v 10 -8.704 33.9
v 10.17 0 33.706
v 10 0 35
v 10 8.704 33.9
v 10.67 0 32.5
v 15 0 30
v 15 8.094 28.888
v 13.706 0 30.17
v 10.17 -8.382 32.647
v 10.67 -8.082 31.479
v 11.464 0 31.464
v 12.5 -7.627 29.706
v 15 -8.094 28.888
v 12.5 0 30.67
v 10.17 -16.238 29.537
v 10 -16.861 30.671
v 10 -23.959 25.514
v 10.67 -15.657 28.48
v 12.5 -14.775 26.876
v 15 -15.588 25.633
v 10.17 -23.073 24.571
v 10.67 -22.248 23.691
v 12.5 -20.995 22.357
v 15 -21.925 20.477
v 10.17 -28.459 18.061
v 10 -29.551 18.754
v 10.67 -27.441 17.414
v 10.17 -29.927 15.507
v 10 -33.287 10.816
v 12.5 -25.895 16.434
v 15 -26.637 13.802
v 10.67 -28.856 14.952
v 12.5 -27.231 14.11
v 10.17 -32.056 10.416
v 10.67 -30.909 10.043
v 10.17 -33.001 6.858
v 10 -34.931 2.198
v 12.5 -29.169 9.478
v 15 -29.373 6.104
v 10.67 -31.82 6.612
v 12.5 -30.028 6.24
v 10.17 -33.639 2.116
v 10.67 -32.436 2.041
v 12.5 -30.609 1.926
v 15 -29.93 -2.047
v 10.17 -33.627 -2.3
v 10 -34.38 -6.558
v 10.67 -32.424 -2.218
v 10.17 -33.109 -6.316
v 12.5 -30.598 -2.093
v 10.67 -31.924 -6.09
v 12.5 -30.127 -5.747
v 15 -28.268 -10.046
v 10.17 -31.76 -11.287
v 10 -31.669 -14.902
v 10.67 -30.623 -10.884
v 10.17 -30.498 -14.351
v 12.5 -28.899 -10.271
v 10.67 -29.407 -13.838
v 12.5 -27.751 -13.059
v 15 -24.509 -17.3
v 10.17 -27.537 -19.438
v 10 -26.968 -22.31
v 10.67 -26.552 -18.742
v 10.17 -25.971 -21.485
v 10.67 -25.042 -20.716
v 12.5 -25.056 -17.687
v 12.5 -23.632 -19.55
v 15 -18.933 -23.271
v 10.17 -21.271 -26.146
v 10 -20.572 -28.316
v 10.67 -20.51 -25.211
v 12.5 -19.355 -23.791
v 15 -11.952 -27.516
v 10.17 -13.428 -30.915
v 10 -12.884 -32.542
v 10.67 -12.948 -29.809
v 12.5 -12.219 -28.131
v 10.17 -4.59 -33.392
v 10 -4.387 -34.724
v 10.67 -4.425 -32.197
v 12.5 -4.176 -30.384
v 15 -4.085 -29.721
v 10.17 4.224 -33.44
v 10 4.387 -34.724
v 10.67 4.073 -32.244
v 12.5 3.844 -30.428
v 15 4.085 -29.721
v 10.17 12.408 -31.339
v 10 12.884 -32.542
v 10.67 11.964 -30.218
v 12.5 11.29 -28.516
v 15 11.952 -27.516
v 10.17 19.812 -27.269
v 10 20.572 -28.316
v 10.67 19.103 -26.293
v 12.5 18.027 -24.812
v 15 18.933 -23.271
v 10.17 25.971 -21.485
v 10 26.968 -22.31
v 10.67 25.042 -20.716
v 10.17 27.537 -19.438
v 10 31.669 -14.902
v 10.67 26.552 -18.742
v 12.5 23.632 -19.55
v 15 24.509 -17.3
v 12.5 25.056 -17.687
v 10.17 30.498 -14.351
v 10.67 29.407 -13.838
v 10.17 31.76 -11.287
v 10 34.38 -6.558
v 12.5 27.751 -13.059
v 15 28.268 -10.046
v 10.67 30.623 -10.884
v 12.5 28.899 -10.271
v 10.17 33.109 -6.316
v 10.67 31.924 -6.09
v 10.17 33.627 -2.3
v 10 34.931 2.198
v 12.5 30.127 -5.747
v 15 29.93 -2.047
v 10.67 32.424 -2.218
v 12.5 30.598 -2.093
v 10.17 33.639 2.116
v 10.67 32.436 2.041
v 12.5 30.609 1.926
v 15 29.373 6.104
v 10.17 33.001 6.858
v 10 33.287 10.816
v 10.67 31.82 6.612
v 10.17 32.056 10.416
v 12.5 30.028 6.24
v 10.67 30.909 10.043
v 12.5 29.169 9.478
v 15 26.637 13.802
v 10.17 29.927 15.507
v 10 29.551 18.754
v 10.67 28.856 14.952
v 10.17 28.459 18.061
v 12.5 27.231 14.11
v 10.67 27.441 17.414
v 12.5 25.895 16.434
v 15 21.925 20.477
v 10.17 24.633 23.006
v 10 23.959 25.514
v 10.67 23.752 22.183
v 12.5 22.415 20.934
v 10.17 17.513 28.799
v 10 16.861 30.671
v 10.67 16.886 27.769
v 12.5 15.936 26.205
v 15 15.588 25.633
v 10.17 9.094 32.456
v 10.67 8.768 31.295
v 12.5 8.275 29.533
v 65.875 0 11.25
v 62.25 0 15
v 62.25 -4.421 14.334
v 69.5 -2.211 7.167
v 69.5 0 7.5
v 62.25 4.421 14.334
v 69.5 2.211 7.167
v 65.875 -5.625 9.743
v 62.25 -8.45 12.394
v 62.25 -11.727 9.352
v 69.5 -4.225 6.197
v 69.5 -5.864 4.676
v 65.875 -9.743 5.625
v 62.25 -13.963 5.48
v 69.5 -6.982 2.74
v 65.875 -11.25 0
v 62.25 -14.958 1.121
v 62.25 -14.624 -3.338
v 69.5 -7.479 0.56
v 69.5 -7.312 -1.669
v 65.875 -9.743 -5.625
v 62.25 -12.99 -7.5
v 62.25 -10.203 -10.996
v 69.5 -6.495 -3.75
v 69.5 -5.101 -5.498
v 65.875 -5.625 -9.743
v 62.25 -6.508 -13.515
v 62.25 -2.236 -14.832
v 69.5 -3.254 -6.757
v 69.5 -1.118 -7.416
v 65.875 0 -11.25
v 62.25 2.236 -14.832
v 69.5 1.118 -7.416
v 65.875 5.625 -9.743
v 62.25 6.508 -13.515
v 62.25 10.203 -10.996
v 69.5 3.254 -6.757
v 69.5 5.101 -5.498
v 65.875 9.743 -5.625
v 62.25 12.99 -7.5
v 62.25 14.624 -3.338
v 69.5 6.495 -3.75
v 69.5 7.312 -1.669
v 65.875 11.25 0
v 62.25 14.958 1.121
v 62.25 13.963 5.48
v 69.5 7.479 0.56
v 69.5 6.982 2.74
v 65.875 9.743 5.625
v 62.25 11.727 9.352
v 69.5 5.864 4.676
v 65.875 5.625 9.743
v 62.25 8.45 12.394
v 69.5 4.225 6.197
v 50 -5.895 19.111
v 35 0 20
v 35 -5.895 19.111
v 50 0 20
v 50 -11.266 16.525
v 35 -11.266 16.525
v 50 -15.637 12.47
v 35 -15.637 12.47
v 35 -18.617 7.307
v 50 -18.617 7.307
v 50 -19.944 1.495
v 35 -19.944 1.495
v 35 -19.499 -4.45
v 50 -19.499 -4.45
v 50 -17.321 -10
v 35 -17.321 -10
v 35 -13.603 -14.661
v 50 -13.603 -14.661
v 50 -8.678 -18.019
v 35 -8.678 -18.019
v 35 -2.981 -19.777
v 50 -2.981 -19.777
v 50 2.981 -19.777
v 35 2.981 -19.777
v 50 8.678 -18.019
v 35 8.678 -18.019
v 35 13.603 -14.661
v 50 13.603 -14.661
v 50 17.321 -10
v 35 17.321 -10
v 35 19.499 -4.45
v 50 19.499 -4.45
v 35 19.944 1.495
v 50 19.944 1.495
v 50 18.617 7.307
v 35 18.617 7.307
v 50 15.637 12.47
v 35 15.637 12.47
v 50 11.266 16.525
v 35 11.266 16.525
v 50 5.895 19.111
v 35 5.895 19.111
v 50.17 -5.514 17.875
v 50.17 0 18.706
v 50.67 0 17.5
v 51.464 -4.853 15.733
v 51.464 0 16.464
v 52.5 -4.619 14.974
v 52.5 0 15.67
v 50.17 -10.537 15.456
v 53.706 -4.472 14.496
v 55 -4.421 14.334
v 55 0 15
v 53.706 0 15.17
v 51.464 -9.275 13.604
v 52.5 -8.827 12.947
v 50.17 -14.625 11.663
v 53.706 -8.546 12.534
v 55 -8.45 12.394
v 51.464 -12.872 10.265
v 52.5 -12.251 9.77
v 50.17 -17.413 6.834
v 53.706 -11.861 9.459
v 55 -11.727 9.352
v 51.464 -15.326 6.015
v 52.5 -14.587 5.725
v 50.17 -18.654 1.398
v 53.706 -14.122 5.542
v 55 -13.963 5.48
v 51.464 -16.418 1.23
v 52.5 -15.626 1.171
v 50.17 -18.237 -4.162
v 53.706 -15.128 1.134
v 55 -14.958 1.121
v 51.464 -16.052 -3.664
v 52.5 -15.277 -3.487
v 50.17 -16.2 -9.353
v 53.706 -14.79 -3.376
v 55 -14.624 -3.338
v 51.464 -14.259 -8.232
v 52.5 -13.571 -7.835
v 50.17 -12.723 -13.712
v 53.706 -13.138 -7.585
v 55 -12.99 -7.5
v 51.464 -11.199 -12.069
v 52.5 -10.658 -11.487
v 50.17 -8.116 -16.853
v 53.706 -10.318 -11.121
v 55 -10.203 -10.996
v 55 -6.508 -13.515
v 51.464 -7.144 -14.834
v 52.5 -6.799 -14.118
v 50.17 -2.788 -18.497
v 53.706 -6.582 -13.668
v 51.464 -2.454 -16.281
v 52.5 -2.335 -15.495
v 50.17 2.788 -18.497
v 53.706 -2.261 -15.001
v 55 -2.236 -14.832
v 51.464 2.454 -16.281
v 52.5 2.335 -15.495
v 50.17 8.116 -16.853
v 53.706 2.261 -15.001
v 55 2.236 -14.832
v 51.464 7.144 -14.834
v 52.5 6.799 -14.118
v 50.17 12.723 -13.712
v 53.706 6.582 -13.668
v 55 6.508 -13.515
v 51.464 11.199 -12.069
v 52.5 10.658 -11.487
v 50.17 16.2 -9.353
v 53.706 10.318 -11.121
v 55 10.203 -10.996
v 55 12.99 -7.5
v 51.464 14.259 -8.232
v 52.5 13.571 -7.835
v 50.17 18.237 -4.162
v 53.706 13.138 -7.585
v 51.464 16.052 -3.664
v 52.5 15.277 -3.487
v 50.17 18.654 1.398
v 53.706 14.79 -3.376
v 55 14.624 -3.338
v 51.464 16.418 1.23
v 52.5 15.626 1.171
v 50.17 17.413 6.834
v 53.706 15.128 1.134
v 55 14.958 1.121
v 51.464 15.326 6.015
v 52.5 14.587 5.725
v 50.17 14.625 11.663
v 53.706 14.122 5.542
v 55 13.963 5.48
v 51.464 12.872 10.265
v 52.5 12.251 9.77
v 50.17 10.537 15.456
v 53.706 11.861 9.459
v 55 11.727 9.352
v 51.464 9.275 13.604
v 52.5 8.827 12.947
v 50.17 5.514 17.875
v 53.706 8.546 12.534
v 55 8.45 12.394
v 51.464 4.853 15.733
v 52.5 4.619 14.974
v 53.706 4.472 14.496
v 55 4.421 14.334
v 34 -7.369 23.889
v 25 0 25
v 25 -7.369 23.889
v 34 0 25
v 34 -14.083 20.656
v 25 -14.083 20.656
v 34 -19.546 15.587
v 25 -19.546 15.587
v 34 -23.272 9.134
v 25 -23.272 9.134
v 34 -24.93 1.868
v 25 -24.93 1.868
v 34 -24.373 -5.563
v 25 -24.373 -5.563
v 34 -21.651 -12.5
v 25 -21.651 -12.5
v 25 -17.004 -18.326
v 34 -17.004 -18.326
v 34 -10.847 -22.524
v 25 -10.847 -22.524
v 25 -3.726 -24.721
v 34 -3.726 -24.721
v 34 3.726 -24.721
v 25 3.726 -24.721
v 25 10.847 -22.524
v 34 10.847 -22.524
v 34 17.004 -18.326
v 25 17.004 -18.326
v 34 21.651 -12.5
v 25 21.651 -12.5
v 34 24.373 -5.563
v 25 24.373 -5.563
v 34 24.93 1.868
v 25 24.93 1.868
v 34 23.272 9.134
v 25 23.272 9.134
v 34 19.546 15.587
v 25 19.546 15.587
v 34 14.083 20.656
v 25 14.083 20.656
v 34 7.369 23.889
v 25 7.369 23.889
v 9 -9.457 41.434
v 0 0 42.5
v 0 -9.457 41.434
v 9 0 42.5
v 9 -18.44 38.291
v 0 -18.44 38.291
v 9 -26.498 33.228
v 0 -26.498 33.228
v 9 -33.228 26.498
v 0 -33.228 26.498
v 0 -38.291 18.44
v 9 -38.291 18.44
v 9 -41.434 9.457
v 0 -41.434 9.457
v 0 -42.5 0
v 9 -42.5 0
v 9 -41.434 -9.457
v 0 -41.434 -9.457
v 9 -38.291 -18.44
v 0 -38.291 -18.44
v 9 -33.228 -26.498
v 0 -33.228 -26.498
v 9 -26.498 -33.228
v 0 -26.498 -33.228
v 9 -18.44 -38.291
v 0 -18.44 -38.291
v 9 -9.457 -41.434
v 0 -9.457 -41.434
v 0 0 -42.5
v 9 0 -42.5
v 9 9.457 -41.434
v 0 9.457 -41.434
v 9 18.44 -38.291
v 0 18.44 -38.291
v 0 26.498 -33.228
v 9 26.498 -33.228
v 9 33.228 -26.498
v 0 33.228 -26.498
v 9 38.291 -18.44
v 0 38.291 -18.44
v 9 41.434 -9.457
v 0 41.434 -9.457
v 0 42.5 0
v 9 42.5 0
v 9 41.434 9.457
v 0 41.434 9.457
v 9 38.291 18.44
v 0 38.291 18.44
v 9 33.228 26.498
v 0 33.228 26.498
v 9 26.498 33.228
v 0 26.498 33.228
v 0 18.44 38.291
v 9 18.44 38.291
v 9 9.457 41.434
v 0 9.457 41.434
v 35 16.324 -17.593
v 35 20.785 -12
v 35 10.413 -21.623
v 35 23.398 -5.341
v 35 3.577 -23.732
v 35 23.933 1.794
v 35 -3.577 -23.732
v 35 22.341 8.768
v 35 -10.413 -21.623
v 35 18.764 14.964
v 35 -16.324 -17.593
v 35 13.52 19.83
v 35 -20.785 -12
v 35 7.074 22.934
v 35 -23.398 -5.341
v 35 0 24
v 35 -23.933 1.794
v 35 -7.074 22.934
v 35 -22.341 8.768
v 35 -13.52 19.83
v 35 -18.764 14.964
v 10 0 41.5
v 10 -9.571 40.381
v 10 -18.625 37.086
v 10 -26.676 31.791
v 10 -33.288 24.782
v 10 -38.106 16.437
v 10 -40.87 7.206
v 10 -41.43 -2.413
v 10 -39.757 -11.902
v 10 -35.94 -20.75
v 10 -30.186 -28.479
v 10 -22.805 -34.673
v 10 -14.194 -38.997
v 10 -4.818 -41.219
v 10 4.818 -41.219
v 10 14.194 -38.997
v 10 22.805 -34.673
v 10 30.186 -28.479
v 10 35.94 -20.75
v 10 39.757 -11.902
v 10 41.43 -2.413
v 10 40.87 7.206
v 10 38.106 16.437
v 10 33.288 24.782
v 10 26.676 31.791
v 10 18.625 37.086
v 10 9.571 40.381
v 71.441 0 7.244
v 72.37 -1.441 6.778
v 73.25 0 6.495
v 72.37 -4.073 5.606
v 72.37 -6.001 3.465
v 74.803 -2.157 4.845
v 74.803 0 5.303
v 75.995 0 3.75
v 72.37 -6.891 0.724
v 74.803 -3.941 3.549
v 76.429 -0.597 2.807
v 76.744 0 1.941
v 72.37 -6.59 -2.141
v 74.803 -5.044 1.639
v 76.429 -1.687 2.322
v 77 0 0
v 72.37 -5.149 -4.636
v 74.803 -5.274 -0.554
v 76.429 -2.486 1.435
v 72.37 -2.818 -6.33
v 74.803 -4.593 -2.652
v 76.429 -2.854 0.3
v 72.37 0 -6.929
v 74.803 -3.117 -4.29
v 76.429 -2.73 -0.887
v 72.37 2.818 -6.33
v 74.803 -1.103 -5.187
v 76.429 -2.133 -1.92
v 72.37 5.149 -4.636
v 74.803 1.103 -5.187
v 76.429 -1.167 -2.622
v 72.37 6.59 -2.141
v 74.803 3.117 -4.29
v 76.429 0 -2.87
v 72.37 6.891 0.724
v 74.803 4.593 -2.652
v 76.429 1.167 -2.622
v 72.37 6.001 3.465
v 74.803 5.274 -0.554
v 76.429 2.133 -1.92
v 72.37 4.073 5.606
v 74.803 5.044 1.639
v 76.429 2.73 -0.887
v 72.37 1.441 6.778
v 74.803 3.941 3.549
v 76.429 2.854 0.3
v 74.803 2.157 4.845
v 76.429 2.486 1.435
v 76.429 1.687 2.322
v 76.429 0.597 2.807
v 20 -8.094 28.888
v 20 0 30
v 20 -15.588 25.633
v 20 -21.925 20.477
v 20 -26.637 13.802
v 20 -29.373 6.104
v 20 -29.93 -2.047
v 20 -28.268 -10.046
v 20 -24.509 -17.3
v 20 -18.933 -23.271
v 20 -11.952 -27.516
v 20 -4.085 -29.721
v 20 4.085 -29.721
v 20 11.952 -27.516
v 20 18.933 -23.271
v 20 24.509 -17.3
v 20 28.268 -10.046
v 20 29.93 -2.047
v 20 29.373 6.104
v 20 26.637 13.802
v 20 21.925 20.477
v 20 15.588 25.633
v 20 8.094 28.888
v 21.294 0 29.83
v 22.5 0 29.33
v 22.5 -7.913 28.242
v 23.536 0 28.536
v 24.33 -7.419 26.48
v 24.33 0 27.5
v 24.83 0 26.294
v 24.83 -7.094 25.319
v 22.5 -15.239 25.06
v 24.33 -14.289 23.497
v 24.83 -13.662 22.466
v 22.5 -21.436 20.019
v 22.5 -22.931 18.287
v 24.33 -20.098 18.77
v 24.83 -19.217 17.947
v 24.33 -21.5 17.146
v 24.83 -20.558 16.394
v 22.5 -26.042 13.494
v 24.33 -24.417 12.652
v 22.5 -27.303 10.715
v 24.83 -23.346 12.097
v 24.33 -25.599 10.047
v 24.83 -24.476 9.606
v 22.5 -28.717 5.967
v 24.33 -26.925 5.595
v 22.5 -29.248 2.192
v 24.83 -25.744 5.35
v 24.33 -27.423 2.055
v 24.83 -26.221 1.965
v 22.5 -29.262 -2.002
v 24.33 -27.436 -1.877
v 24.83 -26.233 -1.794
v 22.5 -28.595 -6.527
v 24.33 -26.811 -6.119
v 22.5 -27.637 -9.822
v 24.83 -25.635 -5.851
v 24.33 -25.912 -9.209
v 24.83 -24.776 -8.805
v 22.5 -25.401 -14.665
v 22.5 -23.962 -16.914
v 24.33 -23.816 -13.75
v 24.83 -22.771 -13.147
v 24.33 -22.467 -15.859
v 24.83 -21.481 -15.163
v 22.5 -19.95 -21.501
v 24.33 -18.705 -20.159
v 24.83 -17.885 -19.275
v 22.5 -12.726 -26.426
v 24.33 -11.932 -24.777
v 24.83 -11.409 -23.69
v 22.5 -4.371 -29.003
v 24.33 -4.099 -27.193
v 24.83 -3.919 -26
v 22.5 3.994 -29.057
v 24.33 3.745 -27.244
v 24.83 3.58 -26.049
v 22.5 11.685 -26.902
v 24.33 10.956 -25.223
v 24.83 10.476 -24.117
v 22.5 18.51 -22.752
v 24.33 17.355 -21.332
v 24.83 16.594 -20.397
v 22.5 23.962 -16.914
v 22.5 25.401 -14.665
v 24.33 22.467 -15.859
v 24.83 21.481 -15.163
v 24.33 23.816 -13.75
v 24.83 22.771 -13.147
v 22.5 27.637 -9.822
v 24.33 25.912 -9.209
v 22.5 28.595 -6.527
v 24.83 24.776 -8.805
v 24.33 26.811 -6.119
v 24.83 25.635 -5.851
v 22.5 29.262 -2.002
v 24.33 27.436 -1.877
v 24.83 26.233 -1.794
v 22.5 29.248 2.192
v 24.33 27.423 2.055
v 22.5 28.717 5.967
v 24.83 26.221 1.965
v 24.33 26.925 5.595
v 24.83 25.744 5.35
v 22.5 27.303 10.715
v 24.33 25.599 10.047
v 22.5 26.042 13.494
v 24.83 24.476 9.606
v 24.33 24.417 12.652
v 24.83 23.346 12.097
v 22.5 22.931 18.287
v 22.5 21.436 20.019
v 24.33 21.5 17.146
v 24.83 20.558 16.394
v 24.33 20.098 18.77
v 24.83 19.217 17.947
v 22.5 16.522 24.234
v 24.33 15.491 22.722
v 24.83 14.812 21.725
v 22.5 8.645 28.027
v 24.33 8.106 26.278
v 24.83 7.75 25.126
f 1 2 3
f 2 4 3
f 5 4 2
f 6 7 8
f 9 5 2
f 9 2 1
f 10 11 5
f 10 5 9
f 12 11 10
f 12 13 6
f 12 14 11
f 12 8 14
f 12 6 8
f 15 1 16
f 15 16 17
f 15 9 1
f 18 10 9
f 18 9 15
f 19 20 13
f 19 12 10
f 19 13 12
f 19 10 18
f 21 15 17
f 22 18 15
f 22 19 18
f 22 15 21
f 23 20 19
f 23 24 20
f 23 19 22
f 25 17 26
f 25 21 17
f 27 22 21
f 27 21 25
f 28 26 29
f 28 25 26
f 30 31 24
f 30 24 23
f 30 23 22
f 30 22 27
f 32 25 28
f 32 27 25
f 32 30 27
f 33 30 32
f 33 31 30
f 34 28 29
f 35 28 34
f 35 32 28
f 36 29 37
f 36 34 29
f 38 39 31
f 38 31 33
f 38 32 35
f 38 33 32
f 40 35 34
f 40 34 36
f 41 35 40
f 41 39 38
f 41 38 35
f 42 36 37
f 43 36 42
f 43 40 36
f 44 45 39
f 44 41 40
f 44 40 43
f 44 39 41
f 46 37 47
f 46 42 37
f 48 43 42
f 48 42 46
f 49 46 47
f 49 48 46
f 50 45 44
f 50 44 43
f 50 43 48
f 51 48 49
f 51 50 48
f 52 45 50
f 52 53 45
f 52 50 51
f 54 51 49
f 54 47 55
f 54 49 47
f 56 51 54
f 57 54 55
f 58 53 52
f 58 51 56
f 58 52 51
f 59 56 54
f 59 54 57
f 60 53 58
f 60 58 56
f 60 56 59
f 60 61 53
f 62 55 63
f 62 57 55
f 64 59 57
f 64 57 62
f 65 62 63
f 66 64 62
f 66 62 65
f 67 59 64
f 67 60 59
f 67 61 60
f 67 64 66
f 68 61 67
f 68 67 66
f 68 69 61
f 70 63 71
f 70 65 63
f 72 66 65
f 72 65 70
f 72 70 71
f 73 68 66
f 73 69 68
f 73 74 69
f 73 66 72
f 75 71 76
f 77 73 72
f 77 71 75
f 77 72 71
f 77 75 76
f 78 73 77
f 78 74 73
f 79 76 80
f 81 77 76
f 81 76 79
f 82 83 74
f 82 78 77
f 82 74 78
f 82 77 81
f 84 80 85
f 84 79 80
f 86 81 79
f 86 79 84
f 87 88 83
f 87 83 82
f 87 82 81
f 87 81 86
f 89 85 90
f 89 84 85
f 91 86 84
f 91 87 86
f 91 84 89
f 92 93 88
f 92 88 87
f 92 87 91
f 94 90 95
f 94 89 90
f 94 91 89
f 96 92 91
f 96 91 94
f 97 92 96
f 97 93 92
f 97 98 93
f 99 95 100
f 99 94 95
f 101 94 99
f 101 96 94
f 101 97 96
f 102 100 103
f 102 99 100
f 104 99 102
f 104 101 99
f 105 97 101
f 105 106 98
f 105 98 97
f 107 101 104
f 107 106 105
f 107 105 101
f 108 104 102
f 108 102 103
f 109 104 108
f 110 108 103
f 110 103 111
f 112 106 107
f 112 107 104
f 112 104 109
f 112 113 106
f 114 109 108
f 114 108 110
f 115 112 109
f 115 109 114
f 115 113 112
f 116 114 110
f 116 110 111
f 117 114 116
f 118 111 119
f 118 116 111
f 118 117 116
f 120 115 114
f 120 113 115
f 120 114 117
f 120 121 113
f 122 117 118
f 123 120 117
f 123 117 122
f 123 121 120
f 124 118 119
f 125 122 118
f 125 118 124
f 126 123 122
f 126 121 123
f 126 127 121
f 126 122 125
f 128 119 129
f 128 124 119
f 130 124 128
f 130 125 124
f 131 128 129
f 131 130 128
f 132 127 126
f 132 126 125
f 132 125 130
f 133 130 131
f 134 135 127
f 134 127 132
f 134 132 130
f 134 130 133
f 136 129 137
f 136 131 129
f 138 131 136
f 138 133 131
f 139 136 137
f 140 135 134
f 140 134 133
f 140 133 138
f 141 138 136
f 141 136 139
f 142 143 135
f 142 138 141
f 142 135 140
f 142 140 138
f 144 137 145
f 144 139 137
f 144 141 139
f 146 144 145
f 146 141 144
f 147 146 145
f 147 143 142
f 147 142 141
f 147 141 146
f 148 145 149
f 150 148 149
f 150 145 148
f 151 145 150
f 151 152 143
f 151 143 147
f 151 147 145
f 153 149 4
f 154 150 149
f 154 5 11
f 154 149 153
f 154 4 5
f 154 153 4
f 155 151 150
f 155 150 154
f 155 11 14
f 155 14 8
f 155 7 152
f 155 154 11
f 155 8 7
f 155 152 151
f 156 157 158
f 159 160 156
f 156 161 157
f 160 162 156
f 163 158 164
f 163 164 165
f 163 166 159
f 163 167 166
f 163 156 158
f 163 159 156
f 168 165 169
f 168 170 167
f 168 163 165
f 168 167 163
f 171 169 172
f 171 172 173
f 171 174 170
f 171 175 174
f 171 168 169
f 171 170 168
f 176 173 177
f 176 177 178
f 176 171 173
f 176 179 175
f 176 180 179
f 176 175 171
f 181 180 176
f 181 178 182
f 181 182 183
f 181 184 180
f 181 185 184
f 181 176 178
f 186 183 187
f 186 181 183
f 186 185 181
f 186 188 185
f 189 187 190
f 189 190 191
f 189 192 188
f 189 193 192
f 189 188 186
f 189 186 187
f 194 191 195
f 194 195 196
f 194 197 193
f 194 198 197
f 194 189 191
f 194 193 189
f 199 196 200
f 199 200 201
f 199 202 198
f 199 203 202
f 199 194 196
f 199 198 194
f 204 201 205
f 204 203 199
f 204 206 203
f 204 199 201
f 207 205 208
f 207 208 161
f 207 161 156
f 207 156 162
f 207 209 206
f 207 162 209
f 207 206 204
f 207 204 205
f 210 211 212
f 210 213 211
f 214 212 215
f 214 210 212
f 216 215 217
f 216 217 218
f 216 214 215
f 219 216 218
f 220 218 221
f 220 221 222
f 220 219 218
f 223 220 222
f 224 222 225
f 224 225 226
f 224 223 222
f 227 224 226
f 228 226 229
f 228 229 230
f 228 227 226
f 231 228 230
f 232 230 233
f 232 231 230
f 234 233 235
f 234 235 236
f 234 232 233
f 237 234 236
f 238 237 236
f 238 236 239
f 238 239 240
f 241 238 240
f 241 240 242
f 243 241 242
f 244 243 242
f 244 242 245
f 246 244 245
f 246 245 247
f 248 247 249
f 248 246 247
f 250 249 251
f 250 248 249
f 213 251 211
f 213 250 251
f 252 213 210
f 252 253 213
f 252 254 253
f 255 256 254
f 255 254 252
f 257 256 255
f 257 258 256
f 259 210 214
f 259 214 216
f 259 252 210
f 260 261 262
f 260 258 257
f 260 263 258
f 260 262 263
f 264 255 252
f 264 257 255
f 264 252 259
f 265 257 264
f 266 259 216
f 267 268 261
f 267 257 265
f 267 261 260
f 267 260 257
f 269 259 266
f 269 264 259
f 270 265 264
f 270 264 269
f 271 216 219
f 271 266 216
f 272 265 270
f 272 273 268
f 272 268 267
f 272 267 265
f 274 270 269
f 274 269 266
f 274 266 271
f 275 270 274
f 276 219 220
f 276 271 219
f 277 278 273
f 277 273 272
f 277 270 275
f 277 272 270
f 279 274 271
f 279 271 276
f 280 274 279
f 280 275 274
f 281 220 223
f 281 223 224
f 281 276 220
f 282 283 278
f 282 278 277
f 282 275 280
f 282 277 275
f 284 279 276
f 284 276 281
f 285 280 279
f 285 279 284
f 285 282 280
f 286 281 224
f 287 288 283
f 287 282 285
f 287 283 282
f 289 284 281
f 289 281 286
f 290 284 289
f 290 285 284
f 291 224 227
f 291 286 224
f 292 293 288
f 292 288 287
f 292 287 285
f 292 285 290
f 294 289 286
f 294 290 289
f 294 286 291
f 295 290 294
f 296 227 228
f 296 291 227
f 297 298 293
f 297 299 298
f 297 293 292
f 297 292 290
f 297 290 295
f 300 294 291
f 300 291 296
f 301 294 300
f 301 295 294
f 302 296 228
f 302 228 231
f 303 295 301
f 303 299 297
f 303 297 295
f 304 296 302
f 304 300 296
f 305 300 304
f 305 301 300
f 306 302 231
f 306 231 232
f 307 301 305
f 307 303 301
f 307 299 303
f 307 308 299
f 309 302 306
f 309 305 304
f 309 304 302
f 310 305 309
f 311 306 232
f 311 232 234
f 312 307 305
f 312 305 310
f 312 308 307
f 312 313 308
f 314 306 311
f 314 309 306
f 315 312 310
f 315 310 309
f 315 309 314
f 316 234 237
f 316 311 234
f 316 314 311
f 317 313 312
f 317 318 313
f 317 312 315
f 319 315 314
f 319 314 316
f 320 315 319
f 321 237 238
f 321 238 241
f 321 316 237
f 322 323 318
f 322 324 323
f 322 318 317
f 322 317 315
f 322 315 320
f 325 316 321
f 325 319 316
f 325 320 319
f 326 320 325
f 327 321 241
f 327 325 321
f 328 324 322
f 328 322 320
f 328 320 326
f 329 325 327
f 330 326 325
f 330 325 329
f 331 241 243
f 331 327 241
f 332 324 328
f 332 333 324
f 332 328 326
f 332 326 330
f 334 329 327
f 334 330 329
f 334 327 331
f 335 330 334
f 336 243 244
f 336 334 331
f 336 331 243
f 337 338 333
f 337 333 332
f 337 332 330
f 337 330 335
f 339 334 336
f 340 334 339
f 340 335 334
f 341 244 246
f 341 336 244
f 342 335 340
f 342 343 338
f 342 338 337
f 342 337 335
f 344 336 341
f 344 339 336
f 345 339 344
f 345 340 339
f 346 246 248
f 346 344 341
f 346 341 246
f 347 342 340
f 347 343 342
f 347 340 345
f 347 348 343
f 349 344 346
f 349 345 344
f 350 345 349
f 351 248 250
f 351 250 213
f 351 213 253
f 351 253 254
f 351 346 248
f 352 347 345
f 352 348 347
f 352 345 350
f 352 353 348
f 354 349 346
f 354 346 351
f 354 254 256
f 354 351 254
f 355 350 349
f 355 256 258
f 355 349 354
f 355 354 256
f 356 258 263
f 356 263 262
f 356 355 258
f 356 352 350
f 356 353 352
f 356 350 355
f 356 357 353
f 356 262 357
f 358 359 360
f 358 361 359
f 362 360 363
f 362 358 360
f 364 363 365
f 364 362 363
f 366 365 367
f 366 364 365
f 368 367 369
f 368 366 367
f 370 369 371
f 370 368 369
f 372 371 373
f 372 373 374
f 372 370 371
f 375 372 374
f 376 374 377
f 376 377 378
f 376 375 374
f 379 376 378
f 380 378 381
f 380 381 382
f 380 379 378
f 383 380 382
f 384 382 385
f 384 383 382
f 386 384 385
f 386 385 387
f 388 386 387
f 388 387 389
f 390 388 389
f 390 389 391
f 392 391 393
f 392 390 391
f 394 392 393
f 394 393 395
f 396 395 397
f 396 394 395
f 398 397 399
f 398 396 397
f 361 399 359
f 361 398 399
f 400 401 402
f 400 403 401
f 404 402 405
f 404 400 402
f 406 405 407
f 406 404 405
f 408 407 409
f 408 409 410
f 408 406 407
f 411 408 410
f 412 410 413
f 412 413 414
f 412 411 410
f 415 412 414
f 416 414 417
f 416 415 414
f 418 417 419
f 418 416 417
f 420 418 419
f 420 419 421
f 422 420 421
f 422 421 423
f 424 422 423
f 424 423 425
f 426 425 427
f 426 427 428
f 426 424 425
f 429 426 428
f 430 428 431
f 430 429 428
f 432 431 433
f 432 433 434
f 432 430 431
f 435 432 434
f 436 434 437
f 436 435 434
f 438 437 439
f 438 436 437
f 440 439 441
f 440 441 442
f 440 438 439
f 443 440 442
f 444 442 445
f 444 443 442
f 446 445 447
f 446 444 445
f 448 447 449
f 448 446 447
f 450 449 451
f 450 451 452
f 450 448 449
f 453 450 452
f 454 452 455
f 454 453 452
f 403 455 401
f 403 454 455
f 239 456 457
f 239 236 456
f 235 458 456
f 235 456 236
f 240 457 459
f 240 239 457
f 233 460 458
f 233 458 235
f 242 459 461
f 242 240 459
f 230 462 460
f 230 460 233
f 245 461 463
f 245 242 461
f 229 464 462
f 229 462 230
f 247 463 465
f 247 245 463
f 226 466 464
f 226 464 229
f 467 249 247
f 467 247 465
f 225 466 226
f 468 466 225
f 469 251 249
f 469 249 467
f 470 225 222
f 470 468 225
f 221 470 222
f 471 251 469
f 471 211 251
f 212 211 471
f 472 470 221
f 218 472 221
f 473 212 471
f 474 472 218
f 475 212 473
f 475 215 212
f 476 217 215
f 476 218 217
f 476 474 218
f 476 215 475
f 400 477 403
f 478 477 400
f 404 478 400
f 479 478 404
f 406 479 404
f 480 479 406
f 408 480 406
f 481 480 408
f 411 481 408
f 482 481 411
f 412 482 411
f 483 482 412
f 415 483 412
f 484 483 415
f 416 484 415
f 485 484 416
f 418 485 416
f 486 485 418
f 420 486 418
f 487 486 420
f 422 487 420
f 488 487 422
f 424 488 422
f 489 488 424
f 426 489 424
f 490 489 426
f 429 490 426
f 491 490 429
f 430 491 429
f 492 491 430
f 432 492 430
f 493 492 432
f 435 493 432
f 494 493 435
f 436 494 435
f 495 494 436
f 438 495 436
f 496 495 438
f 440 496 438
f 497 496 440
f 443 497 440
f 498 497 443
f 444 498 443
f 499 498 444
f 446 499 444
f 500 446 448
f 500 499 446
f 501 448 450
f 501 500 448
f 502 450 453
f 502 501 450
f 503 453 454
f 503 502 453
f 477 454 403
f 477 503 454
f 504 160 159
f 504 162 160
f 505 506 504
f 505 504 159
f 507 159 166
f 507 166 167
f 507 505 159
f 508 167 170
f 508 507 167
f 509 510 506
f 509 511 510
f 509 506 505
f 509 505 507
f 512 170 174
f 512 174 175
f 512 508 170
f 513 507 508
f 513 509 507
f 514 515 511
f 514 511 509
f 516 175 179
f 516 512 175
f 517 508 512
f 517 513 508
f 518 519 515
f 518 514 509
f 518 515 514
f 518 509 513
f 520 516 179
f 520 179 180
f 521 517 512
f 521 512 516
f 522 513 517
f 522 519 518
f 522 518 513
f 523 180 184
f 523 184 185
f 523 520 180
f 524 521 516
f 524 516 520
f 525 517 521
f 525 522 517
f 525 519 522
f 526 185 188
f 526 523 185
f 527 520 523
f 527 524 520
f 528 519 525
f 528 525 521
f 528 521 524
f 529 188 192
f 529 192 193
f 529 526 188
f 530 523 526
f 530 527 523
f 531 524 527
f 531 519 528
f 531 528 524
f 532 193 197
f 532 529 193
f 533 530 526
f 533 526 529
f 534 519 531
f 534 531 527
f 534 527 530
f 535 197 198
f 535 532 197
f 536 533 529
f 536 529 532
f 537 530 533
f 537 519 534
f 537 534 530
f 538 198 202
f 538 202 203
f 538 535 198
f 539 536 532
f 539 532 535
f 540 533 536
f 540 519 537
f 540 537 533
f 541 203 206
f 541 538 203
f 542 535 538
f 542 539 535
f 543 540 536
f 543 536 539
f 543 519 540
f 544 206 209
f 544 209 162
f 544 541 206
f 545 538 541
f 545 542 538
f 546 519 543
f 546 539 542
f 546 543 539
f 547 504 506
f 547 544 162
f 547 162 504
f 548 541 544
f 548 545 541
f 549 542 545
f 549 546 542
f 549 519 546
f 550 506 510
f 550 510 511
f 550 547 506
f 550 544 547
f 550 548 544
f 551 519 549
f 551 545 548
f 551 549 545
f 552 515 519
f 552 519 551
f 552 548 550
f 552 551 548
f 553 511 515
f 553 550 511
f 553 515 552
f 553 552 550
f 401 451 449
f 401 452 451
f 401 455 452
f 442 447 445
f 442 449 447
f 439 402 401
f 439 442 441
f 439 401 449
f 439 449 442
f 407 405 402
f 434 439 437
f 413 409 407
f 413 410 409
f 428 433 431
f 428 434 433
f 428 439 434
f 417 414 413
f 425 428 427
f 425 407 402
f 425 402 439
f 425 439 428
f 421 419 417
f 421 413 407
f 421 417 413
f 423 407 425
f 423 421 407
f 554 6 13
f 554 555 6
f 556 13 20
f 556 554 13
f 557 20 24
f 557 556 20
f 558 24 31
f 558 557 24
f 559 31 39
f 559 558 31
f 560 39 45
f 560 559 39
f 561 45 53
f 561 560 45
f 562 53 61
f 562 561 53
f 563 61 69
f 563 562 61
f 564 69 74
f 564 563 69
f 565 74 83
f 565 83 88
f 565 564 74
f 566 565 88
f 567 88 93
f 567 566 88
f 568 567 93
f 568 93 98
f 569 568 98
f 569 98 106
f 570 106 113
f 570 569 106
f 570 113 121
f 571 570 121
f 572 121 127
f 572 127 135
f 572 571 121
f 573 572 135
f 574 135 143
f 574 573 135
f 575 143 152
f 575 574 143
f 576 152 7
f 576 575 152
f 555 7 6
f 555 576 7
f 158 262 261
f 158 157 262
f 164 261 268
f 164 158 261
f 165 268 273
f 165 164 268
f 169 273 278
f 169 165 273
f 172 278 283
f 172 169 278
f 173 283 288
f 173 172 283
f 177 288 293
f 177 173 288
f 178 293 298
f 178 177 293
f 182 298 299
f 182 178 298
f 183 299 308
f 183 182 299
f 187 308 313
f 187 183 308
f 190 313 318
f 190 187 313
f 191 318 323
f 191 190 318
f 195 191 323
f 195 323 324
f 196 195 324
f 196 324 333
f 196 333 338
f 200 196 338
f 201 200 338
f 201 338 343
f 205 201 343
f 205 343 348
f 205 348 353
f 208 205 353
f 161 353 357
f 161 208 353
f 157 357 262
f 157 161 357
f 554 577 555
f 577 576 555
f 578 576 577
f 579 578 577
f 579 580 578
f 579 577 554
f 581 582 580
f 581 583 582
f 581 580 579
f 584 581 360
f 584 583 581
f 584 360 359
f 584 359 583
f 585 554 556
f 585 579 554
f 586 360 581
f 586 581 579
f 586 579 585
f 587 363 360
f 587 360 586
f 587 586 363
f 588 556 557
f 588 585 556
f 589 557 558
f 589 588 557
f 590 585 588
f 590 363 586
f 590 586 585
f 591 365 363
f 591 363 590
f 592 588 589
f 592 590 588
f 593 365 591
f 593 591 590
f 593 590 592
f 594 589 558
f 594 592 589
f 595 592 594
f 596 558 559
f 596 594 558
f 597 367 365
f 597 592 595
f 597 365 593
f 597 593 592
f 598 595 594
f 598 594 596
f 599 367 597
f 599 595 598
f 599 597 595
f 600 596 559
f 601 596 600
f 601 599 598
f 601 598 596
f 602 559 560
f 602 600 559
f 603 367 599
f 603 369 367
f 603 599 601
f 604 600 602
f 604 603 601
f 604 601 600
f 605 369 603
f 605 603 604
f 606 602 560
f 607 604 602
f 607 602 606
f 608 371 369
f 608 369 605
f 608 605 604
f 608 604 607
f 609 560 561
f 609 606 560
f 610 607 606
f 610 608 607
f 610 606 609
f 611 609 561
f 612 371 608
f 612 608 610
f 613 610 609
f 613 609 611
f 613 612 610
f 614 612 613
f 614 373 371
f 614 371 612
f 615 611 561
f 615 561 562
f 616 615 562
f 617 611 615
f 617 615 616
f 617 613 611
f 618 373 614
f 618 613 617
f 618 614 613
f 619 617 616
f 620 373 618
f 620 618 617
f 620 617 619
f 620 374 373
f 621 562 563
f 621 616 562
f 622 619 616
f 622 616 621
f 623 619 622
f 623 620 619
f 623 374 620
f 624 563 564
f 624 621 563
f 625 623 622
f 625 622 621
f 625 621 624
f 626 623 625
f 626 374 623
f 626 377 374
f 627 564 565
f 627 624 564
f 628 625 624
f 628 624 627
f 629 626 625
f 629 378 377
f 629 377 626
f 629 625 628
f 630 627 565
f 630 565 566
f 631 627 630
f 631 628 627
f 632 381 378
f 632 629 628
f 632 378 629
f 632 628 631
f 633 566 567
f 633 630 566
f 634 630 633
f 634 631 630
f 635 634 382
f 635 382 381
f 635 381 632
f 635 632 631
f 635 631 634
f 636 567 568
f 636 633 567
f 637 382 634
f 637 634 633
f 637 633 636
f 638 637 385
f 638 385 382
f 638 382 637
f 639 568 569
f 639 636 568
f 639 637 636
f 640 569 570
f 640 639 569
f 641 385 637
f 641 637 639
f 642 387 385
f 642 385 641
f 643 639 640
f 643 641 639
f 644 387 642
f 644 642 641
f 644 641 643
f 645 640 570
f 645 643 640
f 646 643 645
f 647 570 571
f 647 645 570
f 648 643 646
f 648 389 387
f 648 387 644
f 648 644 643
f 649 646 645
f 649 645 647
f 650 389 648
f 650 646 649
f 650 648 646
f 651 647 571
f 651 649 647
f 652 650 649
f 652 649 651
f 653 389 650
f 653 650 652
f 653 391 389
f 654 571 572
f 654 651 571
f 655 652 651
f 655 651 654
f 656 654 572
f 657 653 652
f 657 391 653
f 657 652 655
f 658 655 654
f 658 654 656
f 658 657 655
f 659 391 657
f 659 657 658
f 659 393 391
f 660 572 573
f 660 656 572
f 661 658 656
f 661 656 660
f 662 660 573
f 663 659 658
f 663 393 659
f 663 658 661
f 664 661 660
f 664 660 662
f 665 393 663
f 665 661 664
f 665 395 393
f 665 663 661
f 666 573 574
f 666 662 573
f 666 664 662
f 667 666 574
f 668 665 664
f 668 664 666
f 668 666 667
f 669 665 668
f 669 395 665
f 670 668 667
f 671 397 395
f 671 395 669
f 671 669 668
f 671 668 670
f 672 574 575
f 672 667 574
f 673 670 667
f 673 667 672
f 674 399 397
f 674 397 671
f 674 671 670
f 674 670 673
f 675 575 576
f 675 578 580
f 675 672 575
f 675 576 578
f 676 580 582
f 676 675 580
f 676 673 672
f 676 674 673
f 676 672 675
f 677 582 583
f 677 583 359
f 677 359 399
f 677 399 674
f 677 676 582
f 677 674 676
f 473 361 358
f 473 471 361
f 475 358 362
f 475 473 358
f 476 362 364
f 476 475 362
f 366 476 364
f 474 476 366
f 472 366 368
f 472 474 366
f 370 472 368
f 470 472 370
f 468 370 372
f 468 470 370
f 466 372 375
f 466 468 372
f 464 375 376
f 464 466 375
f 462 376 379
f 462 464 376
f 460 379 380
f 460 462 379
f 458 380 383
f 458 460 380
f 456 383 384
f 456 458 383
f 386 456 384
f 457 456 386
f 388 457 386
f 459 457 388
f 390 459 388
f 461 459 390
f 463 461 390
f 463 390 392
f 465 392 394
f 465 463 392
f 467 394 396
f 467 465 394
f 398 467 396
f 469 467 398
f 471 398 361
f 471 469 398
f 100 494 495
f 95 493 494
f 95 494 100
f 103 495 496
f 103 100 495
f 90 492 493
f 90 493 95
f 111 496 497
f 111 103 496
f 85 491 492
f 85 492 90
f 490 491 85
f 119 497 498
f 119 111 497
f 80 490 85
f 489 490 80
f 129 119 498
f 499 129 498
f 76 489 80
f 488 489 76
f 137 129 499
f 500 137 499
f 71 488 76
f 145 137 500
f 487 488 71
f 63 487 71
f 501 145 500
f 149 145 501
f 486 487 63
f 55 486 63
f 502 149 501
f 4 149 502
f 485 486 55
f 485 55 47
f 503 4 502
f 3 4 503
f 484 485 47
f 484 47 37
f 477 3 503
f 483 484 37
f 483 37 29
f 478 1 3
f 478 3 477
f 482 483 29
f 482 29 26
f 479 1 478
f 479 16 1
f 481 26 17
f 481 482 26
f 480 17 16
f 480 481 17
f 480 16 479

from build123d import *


with BuildPart() as part:
    # Sketch1 → Revolve1 (revolve)
    with BuildSketch(Plane.XY, mode=Mode.PRIVATE) as revolve1_sk:
        with BuildLine():
            ThreePointArc((10, 35), (11.464466094, 31.464466094), (15, 30))
            Line((15, 30), (20, 30))
            ThreePointArc((20, 30), (23.535533906, 28.535533906), (25, 25))
            Line((25, 25), (34, 25))
            Line((34, 25), (35, 24))
            Line((35, 24), (35, 20))
            Line((35, 20), (50, 20))
            ThreePointArc((50, 20), (51.464466094, 16.464466094), (55, 15))
            Line((55, 15), (62.25, 15))
            Line((62.25, 15), (69.5, 7.5))
            ThreePointArc((69.5, 7.5), (74.803300859, 5.303300859), (77, 0))
            Line((77, 0), (0, 0))
            Line((0, 0), (0, 42.5))
            Line((0, 42.5), (9, 42.5))
            Line((9, 42.5), (10, 41.5))
            Line((10, 41.5), (10, 35))
        make_face()
    revolve(revolve1_sk.sketch.rotate(Axis((0, 0, 0), (1, 0, 0)), 90), axis=Axis((0, 0, 0), (1, 0, 0)))


solid = part.part
